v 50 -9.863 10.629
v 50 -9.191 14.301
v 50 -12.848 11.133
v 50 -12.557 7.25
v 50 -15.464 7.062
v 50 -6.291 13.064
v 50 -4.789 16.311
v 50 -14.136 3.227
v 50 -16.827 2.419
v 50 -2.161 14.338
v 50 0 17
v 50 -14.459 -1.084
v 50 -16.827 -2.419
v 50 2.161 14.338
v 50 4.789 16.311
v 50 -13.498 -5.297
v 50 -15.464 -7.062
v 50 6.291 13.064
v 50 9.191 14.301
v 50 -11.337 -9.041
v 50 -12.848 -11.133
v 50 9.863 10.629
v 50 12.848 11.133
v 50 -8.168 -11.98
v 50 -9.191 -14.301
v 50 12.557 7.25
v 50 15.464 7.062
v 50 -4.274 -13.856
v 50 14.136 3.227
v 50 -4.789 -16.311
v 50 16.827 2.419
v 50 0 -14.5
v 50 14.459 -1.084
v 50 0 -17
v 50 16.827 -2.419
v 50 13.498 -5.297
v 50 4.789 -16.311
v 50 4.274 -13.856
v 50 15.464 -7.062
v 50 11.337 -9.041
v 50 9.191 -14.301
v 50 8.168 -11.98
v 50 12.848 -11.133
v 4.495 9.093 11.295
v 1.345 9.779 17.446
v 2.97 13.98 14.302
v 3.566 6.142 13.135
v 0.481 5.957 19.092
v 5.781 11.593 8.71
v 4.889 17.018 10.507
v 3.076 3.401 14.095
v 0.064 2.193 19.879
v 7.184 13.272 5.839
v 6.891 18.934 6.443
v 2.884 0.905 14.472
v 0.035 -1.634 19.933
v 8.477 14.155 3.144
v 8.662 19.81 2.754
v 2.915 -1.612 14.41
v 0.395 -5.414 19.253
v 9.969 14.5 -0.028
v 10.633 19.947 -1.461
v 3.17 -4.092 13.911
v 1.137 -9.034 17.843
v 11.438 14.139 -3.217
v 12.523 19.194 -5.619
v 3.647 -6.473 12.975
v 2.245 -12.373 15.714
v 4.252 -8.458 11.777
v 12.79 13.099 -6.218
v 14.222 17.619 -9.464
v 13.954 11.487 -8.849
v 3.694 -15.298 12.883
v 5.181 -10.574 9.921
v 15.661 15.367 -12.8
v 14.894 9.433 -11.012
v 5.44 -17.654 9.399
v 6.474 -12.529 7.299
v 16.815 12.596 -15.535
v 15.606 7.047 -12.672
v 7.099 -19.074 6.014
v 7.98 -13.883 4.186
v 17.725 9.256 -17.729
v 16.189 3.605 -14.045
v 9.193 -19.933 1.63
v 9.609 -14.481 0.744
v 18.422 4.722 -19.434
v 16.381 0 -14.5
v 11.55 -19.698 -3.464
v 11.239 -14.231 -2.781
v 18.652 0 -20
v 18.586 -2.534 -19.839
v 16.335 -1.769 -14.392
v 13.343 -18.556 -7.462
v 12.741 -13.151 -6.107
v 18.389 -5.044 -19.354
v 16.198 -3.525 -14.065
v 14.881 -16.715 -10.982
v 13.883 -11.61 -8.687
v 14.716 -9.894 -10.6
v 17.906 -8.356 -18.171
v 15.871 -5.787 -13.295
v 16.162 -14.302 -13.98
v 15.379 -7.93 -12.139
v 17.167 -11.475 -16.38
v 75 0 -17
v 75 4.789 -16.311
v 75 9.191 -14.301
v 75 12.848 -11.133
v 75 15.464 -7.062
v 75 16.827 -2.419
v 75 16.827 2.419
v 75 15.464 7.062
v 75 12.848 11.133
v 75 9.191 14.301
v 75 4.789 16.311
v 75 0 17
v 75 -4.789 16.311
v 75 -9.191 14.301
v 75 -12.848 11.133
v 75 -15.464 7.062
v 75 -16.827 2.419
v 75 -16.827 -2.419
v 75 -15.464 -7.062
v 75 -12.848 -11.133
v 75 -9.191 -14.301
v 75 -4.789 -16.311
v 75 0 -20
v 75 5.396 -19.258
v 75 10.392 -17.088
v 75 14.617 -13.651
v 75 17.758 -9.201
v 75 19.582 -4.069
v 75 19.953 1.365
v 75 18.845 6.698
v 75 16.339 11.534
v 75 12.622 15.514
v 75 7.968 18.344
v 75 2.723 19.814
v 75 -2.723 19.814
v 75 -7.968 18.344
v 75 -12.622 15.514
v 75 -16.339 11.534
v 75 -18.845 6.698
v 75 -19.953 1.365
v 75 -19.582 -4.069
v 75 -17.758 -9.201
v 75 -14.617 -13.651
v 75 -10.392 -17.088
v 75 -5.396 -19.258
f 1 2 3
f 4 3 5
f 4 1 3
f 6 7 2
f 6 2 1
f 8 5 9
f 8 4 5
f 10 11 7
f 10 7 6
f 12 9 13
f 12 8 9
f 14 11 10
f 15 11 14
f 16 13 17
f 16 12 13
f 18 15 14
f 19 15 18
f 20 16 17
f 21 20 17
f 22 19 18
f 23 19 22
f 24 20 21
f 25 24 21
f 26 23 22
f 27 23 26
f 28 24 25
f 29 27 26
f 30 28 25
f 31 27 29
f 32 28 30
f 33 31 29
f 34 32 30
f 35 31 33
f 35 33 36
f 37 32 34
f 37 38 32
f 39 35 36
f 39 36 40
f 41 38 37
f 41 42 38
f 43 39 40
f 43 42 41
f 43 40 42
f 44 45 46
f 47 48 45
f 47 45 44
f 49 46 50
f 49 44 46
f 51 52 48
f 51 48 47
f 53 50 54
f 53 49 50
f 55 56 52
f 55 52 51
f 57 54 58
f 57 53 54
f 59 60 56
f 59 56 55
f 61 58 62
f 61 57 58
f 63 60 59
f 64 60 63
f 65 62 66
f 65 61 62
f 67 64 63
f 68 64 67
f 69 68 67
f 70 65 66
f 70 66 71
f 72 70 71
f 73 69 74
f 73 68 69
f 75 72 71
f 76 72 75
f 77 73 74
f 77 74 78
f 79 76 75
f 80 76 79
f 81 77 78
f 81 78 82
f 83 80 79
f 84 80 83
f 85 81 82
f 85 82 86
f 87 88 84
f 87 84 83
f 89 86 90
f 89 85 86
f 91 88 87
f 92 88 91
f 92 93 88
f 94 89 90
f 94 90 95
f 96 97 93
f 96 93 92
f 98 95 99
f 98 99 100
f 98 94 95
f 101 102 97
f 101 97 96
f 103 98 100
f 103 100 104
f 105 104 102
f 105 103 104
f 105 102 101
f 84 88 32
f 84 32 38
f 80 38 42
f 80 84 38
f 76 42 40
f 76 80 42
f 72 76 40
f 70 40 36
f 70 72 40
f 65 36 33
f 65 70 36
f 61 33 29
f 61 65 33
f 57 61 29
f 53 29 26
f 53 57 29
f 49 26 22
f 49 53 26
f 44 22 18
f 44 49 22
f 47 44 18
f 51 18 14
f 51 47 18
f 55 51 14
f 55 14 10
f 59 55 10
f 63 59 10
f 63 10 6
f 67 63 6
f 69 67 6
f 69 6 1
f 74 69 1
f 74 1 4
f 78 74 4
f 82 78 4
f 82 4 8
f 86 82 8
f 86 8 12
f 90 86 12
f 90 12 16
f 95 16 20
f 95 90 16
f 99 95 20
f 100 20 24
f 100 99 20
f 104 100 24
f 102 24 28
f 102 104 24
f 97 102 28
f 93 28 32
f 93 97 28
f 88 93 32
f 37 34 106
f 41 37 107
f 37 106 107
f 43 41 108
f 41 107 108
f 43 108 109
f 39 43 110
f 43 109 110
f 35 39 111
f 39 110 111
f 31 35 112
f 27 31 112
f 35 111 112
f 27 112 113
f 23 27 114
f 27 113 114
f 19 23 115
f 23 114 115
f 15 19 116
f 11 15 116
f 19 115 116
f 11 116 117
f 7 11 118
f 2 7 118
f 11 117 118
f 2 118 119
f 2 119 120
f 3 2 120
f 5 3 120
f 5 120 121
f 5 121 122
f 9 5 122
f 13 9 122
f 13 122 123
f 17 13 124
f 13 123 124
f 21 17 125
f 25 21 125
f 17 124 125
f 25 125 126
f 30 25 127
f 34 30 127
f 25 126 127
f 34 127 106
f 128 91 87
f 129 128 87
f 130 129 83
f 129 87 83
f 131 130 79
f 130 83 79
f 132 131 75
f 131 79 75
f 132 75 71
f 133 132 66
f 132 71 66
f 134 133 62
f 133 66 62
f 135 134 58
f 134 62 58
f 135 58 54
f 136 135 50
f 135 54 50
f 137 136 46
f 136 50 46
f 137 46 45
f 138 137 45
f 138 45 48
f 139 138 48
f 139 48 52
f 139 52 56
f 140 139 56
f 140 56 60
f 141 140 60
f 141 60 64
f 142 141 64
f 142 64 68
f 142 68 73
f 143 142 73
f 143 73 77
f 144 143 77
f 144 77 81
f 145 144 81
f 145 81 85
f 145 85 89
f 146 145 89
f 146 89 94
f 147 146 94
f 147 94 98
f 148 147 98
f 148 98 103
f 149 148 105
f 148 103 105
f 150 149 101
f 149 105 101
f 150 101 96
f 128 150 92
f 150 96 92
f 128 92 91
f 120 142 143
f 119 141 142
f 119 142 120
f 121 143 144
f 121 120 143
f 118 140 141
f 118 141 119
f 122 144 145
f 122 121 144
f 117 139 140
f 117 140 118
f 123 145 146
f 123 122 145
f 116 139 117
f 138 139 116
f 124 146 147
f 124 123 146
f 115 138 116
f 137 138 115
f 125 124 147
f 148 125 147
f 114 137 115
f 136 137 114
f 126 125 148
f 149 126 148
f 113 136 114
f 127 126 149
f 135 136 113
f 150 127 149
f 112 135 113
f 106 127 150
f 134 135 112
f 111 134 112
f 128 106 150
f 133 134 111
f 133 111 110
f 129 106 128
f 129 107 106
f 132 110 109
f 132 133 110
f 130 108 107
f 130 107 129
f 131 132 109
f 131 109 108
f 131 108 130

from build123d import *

# Parameters (mm, degrees)
SKETCH1_R               = 20
BOSS_EXTRUDE1_DEPTH     = 75
CUT_EXTRUDE2_DEPTH      = 81.156097709
CUT_EXTRUDE2_DEPTH_BACK = 81.156097709
SKETCH3_R               = 14.5
SKETCH4_R               = 17
CUT_EXTRUDE3_DEPTH      = 25
CUT_EXTRUDE4_DEPTH      = 81.156097709
CUT_EXTRUDE4_DEPTH_BACK = 81.156097709
SKETCH5_R               = 426.5


with BuildPart() as part:
    # Sketch1 → Boss-Extrude1 (new body)
    with BuildSketch(Plane(origin=(0, 0, 0), x_dir=(0, 0, -1), z_dir=(1, 0, 0))):
        Circle(SKETCH1_R)
    extrude(amount=BOSS_EXTRUDE1_DEPTH)

    # Sketch3 → Cut-Extrude2 (cut, two sides: drawn at the far end of the back side and taken through both)
    with BuildSketch(Plane(origin=(75, 0, 0), x_dir=(0, 0, -1), z_dir=(1, 0, 0)).offset(-CUT_EXTRUDE2_DEPTH_BACK)):
        Circle(SKETCH3_R)
    extrude(amount=CUT_EXTRUDE2_DEPTH + CUT_EXTRUDE2_DEPTH_BACK, mode=Mode.SUBTRACT)

    # Sketch4 → Cut-Extrude3 (cut)
    with BuildSketch(Plane(origin=(75, 0, 0), x_dir=(0, 0, -1), z_dir=(1, 0, 0))):
        Circle(SKETCH4_R)
    extrude(amount=-CUT_EXTRUDE3_DEPTH, mode=Mode.SUBTRACT)

    # Sketch5 → Cut-Extrude4 (cut, two sides: drawn at the far end of the back side and taken through both)
    with BuildSketch(Plane(origin=(0, 0, 0), x_dir=(1, 0, 0), z_dir=(0, 1, 0)).offset(-CUT_EXTRUDE4_DEPTH_BACK)):
        with Locations((-376.699150517, 180)):
            Circle(SKETCH5_R)
    extrude(amount=CUT_EXTRUDE4_DEPTH + CUT_EXTRUDE4_DEPTH_BACK, mode=Mode.SUBTRACT)


solid = part.part
